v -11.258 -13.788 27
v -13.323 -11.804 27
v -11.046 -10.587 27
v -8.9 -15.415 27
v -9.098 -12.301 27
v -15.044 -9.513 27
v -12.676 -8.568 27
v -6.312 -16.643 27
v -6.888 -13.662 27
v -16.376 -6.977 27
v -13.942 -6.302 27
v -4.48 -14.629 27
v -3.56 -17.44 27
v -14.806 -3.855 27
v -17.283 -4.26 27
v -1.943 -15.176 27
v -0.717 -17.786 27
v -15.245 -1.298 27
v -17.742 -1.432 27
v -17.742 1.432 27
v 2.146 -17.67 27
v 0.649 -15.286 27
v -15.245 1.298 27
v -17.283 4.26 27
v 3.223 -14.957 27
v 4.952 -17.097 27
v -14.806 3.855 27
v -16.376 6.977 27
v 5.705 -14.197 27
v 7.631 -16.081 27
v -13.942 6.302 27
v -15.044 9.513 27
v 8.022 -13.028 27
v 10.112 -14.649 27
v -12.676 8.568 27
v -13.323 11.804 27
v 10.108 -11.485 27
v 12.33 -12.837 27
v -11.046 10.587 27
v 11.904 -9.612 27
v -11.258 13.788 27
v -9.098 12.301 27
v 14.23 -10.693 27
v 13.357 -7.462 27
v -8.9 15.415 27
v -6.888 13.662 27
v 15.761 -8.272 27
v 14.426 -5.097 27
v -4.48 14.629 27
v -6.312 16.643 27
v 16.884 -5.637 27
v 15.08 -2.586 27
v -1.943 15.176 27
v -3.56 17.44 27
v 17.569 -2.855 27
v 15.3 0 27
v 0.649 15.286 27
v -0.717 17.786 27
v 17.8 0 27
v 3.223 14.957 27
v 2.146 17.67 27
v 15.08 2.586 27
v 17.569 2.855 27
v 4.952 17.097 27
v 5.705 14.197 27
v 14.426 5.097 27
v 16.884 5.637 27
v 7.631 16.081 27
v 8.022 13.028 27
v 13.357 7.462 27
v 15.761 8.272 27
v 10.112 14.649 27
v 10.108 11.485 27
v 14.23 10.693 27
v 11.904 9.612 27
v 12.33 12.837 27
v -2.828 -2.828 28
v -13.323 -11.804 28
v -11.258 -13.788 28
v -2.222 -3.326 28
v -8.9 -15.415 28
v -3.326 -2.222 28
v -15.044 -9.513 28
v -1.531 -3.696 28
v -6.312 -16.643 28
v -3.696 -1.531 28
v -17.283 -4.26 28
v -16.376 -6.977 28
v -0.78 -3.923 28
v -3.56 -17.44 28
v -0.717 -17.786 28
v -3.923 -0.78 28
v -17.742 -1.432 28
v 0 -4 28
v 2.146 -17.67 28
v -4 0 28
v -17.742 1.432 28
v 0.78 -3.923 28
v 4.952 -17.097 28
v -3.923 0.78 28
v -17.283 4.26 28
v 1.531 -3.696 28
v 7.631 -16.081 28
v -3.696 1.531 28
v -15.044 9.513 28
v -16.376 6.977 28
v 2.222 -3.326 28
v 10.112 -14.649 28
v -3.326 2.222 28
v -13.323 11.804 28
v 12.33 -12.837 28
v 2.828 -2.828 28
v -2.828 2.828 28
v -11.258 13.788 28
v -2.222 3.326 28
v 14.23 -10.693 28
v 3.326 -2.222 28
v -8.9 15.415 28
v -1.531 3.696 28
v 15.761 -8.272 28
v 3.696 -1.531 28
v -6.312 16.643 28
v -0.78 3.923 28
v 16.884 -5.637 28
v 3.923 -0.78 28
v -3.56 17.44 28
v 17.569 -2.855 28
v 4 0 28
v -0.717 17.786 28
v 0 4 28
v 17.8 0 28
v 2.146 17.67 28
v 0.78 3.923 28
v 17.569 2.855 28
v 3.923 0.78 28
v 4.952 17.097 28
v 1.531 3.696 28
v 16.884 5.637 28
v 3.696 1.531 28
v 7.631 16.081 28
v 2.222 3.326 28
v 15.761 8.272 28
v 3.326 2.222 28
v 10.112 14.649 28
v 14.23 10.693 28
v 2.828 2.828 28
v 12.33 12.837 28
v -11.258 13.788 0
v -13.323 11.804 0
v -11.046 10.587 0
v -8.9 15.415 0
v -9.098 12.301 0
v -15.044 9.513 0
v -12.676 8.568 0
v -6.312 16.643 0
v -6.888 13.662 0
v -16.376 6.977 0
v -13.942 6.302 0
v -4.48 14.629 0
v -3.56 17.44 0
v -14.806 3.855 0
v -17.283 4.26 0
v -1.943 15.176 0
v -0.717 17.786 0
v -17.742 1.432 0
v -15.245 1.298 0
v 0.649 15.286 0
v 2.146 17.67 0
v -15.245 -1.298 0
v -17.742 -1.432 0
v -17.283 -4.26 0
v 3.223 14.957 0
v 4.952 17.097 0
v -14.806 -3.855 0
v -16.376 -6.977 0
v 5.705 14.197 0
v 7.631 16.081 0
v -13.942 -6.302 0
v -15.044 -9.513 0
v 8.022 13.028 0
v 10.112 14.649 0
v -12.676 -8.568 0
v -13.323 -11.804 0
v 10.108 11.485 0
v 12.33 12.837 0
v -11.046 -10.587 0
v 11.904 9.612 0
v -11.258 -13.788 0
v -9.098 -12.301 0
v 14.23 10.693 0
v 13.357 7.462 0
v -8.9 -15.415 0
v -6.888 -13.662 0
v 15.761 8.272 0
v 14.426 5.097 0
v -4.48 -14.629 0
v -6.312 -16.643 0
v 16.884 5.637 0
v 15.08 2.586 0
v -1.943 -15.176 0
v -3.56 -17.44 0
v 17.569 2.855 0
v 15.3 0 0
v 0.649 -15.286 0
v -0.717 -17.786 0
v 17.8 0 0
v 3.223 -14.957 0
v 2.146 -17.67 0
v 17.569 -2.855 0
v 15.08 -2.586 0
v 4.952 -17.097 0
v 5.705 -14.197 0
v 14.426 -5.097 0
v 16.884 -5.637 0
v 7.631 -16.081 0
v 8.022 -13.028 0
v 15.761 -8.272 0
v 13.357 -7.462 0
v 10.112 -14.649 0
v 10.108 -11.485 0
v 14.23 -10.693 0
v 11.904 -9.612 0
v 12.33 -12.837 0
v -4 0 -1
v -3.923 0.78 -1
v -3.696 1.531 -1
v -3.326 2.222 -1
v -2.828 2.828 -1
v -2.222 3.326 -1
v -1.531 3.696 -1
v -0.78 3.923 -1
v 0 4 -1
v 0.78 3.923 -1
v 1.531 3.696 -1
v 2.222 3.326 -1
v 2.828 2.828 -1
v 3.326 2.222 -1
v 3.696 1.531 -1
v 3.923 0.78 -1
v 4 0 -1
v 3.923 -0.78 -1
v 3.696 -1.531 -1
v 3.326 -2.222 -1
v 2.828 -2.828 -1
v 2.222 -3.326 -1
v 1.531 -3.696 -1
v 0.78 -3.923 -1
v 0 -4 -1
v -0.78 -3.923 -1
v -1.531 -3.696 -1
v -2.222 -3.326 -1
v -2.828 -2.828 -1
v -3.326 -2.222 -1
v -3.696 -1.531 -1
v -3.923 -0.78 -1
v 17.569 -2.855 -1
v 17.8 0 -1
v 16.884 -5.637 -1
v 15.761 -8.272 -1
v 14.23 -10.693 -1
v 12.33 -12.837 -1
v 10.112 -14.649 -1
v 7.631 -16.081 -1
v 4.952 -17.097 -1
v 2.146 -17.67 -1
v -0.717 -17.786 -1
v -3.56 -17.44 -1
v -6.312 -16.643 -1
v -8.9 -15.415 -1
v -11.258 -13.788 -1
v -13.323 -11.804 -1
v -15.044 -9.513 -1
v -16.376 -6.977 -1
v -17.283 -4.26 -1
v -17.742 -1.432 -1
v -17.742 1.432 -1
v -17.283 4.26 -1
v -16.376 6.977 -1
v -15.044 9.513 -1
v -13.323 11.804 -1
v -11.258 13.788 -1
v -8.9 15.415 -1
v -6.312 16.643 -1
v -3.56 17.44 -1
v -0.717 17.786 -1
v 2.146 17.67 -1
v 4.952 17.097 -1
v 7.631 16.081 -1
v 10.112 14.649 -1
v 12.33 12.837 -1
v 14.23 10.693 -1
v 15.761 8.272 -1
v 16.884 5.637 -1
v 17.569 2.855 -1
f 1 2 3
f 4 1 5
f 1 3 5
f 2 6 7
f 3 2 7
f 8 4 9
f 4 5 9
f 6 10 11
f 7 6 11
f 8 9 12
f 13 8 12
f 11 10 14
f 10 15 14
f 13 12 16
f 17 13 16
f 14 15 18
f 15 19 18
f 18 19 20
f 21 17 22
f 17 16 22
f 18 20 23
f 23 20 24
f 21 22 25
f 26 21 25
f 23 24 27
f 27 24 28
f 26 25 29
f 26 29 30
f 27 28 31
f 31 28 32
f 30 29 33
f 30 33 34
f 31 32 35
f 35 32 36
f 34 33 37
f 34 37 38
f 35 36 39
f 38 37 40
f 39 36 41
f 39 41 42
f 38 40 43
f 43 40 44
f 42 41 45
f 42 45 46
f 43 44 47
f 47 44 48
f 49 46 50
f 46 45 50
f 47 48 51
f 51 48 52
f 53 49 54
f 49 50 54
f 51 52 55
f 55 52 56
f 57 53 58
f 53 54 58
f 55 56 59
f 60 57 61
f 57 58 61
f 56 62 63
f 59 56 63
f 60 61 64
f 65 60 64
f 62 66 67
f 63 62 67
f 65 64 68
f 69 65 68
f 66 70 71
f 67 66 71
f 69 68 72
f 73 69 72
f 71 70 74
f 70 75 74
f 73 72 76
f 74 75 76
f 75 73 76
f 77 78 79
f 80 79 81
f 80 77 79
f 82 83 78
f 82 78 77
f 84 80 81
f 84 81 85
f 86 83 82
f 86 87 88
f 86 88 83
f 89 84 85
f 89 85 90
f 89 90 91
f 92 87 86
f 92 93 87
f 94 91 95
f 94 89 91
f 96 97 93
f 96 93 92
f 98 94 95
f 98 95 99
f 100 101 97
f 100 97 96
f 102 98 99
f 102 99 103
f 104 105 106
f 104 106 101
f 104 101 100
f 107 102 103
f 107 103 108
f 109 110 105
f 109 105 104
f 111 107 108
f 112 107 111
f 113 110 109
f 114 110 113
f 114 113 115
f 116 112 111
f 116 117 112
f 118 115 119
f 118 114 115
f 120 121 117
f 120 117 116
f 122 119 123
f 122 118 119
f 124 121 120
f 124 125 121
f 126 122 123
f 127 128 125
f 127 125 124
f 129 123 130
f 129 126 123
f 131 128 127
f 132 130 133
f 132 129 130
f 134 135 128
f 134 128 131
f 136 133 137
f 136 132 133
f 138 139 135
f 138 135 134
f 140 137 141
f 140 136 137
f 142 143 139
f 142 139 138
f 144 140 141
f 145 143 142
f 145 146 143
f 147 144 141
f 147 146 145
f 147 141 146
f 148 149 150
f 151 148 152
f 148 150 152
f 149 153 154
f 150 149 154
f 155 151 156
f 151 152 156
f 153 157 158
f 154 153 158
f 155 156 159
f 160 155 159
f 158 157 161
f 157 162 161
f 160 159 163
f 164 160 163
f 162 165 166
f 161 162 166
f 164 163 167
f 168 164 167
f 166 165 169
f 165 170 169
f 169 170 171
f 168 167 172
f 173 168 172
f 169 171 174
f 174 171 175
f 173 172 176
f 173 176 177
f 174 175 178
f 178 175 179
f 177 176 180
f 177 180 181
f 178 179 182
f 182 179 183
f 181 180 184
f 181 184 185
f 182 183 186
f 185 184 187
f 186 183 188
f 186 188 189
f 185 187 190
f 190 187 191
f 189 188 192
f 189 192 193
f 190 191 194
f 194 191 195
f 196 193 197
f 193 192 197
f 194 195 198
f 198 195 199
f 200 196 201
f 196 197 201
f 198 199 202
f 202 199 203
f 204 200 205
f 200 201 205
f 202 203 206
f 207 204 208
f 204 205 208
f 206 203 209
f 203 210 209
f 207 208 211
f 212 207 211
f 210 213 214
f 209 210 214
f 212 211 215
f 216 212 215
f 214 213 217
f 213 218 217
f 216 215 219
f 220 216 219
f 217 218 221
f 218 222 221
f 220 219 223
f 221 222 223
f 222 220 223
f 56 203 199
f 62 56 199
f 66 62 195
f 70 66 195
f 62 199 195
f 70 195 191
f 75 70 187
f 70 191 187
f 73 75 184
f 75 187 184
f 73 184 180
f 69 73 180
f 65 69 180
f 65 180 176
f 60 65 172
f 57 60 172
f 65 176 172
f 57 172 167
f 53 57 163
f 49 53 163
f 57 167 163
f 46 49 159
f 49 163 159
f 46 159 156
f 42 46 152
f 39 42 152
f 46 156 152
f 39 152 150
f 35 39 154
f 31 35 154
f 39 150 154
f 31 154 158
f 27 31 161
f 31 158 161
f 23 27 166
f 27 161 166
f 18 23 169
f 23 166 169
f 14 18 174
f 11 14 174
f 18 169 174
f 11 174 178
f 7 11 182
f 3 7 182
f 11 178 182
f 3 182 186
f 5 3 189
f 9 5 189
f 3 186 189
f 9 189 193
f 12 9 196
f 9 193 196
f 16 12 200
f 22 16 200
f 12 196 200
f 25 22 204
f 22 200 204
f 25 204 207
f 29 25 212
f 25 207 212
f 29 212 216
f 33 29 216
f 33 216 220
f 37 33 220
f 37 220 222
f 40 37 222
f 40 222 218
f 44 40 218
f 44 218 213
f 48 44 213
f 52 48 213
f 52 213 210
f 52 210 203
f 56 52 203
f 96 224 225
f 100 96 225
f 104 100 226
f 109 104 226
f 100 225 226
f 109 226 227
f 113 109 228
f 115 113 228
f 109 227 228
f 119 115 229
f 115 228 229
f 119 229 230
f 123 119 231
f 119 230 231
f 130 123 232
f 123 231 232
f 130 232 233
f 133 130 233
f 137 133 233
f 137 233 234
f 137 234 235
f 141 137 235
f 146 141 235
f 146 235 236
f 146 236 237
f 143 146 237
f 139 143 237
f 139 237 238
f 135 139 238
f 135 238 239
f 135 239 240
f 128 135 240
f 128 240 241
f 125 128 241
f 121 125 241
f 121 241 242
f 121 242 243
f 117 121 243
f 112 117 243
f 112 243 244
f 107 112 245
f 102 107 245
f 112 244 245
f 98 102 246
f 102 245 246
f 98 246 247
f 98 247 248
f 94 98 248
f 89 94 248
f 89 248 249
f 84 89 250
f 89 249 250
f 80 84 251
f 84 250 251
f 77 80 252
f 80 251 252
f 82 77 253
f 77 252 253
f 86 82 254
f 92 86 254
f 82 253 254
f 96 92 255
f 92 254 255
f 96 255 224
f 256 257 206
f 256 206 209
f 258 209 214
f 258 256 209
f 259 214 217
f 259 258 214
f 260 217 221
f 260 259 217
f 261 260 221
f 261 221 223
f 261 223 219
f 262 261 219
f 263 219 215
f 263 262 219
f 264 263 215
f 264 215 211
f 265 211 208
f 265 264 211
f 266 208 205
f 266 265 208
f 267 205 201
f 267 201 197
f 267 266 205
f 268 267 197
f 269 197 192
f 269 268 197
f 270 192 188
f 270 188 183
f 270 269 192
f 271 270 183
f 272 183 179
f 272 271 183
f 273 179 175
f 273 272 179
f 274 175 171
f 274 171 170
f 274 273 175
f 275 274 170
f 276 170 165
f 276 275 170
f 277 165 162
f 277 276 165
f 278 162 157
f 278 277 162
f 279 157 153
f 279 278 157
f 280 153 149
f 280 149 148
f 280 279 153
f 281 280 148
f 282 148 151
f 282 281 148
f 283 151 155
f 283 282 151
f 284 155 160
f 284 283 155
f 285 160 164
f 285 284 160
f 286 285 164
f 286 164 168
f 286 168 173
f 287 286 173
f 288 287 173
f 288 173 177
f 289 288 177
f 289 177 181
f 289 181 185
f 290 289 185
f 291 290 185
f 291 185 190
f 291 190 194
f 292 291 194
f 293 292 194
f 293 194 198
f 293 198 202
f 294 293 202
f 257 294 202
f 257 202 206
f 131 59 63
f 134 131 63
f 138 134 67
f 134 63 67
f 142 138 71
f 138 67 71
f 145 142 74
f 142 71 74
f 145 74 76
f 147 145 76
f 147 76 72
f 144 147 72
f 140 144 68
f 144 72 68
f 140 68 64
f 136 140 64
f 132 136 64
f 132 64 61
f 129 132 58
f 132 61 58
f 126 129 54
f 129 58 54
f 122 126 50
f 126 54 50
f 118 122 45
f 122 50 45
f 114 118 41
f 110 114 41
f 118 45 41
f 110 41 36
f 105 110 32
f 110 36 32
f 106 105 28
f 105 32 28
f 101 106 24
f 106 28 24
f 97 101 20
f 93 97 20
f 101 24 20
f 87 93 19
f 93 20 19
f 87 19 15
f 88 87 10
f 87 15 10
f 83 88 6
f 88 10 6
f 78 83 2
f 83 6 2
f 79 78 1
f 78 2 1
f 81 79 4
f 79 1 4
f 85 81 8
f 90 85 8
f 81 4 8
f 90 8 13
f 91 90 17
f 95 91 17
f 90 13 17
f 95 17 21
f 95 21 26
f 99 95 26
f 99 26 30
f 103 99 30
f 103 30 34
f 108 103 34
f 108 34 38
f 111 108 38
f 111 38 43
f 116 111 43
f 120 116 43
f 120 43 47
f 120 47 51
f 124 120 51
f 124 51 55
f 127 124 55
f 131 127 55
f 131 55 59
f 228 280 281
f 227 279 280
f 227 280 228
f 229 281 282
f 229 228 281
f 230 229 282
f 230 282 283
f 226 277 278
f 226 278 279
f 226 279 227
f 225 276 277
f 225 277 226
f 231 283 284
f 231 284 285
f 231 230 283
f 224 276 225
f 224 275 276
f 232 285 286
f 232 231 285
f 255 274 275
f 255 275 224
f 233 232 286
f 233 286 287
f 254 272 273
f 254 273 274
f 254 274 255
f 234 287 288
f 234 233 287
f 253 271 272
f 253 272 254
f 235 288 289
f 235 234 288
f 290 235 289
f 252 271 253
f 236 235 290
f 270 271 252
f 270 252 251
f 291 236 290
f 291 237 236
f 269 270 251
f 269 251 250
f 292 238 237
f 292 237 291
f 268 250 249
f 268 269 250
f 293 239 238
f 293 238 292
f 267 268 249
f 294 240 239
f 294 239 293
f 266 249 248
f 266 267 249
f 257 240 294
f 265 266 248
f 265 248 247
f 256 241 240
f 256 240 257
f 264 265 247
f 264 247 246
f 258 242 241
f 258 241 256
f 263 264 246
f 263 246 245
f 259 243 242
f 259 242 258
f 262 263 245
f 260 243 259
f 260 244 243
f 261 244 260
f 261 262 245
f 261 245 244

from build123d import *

# Parameters (mm, degrees)
SKETCH1_R           = 15.3
BOSS_EXTRUDE1_DEPTH = 27
SKETCH2_R           = 17.8
BOSS_EXTRUDE2_DEPTH = 1
BOSS_EXTRUDE4_START = 1
SKETCH6_R           = 17.8
BOSS_EXTRUDE4_DEPTH = 1
SKETCH7_R           = 4
CUT_EXTRUDE1_DEPTH  = 39.401562468


with BuildPart() as part:
    # Sketch1 → Boss-Extrude1 (new body)
    with BuildSketch(Plane.XY):
        Circle(SKETCH1_R)
    extrude(amount=BOSS_EXTRUDE1_DEPTH)

    # Sketch2 → Boss-Extrude2 (add)
    with BuildSketch(Plane.XY.offset(27)):
        Circle(SKETCH2_R)
    extrude(amount=BOSS_EXTRUDE2_DEPTH)

    # Sketch6 → Boss-Extrude4 (add)
    with BuildSketch(Plane(origin=(0, 0, 0), x_dir=(-1, 0, 0), z_dir=(0, 0, -1)).offset(BOSS_EXTRUDE4_START)):
        with Locations(Location((0, 0, 0), (0, 0, 180))):
            Circle(SKETCH6_R)
    extrude(amount=-BOSS_EXTRUDE4_DEPTH)

    # Sketch7 → Cut-Extrude1 (cut, through all)
    with BuildSketch(Plane(origin=(0, 0, -1), x_dir=(-1, 0, 0), z_dir=(0, 0, -1))):
        Circle(SKETCH7_R)
    extrude(amount=-CUT_EXTRUDE1_DEPTH, mode=Mode.SUBTRACT)


solid = part.part
